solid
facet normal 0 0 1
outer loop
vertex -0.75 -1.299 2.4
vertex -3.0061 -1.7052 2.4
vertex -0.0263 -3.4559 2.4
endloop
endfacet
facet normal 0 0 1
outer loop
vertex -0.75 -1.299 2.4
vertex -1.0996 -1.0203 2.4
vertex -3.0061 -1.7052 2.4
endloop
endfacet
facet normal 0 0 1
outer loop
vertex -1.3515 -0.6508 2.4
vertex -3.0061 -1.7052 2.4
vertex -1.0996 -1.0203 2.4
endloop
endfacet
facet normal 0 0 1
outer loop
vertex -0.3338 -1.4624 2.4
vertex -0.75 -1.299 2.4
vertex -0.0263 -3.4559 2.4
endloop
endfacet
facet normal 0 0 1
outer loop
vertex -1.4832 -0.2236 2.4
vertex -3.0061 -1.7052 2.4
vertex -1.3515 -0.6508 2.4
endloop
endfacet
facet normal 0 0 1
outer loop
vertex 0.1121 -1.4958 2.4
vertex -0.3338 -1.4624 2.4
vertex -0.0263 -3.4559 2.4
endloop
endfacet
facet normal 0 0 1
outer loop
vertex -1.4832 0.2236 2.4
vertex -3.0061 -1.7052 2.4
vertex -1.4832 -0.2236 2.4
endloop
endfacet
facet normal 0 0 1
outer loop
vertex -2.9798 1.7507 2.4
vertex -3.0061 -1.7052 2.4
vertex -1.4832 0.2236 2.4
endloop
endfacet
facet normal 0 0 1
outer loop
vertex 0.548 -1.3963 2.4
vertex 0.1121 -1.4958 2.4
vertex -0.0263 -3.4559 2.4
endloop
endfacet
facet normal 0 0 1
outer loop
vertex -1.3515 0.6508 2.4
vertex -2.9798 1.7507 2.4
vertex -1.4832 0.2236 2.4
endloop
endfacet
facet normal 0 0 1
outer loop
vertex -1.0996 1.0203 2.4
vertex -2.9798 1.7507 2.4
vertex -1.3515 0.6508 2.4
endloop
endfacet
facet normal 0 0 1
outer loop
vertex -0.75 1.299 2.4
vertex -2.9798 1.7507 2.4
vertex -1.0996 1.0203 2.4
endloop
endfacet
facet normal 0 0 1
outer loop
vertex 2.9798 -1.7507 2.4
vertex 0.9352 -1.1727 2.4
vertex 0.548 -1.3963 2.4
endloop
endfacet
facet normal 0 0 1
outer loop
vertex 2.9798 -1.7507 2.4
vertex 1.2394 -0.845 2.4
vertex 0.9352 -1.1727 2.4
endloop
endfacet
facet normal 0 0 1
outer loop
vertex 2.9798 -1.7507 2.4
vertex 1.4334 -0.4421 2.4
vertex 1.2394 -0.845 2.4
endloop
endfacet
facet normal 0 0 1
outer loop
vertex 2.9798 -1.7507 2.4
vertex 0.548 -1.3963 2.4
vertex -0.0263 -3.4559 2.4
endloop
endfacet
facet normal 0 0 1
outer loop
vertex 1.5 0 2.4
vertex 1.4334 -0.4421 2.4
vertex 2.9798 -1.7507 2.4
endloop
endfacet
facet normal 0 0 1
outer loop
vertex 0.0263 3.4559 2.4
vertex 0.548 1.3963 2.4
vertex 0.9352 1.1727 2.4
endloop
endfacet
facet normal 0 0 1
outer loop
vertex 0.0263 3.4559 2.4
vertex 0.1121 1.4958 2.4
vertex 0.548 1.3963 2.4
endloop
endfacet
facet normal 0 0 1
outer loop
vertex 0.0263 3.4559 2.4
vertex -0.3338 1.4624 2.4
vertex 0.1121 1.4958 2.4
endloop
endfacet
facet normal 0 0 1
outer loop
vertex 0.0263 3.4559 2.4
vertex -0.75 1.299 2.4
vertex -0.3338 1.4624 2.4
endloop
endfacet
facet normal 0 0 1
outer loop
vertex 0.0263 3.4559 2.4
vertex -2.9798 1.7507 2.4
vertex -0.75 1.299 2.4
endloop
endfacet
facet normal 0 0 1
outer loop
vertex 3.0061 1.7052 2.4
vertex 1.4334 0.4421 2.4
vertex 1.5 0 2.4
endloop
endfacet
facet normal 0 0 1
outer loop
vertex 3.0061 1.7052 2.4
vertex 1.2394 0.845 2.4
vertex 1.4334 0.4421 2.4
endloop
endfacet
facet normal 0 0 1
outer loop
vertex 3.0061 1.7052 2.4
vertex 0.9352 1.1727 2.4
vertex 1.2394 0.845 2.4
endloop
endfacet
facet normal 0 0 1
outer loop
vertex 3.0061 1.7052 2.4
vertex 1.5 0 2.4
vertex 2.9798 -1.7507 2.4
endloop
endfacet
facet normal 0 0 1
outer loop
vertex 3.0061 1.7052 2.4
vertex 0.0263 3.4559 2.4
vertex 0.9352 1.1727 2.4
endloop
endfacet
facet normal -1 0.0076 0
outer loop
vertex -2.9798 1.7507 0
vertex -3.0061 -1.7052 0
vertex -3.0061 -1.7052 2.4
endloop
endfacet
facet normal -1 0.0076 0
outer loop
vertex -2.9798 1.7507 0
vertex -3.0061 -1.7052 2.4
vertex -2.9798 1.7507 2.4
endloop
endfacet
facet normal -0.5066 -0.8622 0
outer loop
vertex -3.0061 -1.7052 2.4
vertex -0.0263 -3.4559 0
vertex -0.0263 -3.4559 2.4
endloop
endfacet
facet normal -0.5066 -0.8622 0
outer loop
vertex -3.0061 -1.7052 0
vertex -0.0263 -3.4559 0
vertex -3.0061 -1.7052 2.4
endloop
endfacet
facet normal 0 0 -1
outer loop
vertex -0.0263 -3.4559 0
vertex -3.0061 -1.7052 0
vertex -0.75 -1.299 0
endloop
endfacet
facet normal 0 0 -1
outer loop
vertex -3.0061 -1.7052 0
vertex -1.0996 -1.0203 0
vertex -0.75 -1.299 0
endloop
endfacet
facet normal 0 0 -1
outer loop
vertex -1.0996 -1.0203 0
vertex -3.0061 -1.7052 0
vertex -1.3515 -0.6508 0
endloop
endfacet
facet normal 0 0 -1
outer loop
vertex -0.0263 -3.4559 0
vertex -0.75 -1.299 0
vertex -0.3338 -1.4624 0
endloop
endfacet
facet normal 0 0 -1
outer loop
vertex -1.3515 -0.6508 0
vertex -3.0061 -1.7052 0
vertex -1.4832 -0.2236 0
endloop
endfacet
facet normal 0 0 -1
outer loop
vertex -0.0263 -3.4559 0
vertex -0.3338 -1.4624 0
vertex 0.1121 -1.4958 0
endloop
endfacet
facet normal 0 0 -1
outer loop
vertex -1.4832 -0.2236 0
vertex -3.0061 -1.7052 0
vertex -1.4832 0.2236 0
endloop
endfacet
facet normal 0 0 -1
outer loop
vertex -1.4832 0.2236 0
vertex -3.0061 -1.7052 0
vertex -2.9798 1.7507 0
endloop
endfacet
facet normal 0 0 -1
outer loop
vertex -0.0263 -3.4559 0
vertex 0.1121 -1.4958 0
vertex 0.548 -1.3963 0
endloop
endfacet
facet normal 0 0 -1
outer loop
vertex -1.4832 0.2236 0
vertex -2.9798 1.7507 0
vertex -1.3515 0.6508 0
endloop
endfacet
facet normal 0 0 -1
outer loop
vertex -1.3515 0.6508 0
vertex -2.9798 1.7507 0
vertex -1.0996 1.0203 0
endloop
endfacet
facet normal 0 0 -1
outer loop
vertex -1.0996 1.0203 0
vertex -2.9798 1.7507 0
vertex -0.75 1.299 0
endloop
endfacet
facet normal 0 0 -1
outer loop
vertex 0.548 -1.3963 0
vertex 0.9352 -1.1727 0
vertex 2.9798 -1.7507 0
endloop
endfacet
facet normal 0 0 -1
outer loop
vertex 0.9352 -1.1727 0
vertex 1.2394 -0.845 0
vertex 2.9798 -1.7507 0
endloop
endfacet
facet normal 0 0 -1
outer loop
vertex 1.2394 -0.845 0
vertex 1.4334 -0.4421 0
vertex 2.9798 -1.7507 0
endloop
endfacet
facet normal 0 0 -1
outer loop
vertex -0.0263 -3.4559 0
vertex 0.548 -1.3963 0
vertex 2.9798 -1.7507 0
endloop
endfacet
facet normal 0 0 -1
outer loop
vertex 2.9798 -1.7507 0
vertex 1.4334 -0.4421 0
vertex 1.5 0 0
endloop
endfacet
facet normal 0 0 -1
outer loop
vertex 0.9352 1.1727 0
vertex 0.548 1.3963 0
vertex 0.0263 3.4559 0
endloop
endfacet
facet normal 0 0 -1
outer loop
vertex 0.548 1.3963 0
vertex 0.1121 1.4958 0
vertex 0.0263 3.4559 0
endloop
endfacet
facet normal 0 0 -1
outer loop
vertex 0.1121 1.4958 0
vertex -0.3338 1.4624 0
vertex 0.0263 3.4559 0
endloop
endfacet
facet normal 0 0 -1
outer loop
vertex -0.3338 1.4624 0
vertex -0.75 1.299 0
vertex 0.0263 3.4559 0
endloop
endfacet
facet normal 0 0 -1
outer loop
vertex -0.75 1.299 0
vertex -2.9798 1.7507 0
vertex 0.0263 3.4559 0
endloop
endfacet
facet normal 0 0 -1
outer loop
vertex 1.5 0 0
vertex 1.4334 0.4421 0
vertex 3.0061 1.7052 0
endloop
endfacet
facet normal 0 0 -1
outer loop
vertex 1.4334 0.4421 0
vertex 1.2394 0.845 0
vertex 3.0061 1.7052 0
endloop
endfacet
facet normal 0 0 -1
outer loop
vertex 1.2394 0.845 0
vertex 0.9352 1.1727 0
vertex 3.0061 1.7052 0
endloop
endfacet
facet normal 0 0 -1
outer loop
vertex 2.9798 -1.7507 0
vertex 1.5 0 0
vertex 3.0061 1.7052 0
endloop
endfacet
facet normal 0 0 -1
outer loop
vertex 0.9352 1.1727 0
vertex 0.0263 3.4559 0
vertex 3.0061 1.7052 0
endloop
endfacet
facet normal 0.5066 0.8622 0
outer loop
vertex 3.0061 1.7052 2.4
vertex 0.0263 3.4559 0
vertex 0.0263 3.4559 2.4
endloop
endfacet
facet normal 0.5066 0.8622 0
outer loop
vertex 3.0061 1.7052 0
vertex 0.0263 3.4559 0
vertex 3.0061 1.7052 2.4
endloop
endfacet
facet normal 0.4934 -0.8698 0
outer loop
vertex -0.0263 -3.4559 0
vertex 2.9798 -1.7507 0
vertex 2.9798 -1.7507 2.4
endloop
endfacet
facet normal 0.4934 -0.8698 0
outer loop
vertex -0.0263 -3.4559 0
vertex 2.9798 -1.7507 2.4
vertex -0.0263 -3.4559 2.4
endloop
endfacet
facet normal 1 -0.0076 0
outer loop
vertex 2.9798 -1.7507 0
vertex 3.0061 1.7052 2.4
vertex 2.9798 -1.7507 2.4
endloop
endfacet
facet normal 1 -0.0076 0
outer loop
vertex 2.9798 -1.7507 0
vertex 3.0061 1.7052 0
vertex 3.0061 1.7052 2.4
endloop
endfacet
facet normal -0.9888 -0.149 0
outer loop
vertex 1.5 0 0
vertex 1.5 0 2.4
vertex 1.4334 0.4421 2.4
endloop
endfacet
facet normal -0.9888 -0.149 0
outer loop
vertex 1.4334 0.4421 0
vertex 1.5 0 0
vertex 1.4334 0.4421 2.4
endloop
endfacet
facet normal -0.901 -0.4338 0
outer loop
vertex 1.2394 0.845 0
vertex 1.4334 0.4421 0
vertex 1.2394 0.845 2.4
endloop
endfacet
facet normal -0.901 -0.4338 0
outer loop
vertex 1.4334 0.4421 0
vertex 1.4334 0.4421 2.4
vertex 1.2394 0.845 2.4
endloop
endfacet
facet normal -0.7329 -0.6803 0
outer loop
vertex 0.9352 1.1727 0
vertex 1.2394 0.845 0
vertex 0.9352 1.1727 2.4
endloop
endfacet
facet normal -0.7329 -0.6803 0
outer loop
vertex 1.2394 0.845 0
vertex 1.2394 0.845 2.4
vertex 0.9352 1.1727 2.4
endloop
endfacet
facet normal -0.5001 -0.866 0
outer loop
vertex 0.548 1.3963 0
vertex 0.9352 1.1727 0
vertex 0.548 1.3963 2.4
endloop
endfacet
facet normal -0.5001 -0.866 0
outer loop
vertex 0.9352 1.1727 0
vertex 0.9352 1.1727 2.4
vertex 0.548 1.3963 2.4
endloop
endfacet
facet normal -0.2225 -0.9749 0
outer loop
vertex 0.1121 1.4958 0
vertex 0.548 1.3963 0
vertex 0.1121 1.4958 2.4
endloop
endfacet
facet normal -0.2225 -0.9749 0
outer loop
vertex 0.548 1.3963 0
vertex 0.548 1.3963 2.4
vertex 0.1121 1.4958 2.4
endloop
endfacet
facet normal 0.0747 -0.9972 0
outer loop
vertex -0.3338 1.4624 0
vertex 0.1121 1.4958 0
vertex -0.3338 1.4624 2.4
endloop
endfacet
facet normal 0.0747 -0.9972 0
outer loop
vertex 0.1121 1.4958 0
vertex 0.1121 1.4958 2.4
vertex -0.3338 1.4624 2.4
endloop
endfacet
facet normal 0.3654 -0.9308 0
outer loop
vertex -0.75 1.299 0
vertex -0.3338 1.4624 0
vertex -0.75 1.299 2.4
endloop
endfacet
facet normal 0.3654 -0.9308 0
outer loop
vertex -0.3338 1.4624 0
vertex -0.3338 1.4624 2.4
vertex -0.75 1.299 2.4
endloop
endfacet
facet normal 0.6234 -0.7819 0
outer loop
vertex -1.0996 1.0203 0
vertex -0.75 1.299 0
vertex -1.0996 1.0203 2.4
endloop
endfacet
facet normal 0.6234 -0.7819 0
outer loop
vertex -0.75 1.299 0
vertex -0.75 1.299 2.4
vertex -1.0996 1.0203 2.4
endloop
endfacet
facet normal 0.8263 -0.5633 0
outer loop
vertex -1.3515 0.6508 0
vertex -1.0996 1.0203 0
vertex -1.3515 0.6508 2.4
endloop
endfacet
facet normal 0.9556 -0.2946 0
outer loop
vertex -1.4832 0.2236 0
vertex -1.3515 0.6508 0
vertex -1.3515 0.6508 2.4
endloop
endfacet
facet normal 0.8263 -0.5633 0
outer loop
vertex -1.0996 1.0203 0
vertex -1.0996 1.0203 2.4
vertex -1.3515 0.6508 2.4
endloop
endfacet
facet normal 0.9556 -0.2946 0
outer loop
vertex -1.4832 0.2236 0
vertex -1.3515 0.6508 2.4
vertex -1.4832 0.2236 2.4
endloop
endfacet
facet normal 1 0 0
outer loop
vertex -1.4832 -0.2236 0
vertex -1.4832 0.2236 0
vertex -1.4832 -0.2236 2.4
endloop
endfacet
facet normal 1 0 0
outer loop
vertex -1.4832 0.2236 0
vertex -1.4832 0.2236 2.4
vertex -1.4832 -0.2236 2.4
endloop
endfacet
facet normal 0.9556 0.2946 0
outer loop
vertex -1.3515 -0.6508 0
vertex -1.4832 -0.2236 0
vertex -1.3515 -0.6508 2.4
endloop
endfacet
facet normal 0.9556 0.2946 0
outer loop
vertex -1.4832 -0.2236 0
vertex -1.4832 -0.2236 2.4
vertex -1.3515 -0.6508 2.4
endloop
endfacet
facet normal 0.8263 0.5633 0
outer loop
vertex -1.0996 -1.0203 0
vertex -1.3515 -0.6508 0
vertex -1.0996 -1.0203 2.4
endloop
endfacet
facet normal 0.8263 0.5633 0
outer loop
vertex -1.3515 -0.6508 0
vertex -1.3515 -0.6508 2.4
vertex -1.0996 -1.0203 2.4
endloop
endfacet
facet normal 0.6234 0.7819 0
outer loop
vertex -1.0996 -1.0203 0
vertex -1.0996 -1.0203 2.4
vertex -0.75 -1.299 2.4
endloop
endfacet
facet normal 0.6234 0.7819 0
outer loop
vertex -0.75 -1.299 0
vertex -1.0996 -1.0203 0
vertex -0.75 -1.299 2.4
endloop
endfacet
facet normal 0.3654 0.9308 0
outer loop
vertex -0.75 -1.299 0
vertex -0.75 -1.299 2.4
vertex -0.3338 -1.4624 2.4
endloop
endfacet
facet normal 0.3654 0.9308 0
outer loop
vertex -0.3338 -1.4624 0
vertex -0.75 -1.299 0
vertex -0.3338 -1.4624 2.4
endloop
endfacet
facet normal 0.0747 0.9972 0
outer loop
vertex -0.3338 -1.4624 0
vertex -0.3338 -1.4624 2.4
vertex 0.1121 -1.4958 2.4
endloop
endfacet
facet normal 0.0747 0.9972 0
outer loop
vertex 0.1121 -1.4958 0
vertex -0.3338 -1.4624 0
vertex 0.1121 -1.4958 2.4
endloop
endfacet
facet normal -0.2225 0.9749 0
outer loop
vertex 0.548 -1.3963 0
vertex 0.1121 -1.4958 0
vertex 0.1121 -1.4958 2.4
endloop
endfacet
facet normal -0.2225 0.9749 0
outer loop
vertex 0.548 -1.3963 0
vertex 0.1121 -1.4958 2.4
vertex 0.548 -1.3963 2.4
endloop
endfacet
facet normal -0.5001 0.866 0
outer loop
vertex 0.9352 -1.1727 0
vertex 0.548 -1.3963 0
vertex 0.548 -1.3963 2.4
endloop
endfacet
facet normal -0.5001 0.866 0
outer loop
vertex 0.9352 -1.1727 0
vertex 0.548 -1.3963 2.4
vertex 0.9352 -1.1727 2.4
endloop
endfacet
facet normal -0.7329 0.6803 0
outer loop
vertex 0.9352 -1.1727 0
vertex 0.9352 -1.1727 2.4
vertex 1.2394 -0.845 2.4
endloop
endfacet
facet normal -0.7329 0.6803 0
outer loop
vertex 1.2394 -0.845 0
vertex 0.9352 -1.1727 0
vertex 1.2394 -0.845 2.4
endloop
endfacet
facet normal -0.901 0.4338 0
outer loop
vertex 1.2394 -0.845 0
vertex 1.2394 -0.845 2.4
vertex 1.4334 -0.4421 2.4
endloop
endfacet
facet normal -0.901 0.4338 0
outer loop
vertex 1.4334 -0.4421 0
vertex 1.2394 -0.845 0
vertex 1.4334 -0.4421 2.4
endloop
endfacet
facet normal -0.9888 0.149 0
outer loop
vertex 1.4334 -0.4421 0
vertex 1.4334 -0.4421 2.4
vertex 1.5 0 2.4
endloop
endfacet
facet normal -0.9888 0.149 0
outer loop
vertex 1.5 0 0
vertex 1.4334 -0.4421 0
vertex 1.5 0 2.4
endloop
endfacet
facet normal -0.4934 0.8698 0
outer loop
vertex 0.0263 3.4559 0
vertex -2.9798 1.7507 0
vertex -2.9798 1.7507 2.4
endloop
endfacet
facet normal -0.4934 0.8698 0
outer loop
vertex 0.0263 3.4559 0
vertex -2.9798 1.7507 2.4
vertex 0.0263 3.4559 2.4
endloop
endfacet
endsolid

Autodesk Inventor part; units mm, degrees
ref_plane "YZ Plane" through (0, 0, 0) normal (1, 0, 0) x (0, 1, 0)
ref_plane "XZ Plane" through (0, 0, 0) normal (0, 1, 0) x (-1, 0, 0)
ref_plane "XY Plane" through (0, 0, 0) normal (0, 0, 1) x (1, 0, 0)
sketch "Skizze1" plane through (0, 0, 0) normal (0, 0, 1) x (1, 0, 0)
  line L0 (-2.9798, 1.7507) -> (0.0263, 3.4559)
  line L1 (0.0263, 3.4559) -> (3.0061, 1.7052)
  line L2 (3.0061, 1.7052) -> (2.9798, -1.7507)
  line L3 (2.9798, -1.7507) -> (-0.0263, -3.4559)
  line L4 (-0.0263, -3.4559) -> (-3.0061, -1.7052)
  line L5 (-3.0061, -1.7052) -> (-2.9798, 1.7507)
  point P0 (0, 0)
extrude "Extrusion1" add sketch "Skizze1" along normal blind 2.4
sketch "Skizze2" plane through (0, 0, 2.4) normal (0, 0, 1) x (1, 0, 0)
  circle A0 centre (0, 0) radius 1.5
  dimension "d3" = 3
extrude "Extrusion2" cut sketch "Skizze2" against normal through all
thread "Gewinde1" size "M3x0.5" class "6H" standard "ANSI Metric M Profile" full length
properties part number "M3 Mutter"
